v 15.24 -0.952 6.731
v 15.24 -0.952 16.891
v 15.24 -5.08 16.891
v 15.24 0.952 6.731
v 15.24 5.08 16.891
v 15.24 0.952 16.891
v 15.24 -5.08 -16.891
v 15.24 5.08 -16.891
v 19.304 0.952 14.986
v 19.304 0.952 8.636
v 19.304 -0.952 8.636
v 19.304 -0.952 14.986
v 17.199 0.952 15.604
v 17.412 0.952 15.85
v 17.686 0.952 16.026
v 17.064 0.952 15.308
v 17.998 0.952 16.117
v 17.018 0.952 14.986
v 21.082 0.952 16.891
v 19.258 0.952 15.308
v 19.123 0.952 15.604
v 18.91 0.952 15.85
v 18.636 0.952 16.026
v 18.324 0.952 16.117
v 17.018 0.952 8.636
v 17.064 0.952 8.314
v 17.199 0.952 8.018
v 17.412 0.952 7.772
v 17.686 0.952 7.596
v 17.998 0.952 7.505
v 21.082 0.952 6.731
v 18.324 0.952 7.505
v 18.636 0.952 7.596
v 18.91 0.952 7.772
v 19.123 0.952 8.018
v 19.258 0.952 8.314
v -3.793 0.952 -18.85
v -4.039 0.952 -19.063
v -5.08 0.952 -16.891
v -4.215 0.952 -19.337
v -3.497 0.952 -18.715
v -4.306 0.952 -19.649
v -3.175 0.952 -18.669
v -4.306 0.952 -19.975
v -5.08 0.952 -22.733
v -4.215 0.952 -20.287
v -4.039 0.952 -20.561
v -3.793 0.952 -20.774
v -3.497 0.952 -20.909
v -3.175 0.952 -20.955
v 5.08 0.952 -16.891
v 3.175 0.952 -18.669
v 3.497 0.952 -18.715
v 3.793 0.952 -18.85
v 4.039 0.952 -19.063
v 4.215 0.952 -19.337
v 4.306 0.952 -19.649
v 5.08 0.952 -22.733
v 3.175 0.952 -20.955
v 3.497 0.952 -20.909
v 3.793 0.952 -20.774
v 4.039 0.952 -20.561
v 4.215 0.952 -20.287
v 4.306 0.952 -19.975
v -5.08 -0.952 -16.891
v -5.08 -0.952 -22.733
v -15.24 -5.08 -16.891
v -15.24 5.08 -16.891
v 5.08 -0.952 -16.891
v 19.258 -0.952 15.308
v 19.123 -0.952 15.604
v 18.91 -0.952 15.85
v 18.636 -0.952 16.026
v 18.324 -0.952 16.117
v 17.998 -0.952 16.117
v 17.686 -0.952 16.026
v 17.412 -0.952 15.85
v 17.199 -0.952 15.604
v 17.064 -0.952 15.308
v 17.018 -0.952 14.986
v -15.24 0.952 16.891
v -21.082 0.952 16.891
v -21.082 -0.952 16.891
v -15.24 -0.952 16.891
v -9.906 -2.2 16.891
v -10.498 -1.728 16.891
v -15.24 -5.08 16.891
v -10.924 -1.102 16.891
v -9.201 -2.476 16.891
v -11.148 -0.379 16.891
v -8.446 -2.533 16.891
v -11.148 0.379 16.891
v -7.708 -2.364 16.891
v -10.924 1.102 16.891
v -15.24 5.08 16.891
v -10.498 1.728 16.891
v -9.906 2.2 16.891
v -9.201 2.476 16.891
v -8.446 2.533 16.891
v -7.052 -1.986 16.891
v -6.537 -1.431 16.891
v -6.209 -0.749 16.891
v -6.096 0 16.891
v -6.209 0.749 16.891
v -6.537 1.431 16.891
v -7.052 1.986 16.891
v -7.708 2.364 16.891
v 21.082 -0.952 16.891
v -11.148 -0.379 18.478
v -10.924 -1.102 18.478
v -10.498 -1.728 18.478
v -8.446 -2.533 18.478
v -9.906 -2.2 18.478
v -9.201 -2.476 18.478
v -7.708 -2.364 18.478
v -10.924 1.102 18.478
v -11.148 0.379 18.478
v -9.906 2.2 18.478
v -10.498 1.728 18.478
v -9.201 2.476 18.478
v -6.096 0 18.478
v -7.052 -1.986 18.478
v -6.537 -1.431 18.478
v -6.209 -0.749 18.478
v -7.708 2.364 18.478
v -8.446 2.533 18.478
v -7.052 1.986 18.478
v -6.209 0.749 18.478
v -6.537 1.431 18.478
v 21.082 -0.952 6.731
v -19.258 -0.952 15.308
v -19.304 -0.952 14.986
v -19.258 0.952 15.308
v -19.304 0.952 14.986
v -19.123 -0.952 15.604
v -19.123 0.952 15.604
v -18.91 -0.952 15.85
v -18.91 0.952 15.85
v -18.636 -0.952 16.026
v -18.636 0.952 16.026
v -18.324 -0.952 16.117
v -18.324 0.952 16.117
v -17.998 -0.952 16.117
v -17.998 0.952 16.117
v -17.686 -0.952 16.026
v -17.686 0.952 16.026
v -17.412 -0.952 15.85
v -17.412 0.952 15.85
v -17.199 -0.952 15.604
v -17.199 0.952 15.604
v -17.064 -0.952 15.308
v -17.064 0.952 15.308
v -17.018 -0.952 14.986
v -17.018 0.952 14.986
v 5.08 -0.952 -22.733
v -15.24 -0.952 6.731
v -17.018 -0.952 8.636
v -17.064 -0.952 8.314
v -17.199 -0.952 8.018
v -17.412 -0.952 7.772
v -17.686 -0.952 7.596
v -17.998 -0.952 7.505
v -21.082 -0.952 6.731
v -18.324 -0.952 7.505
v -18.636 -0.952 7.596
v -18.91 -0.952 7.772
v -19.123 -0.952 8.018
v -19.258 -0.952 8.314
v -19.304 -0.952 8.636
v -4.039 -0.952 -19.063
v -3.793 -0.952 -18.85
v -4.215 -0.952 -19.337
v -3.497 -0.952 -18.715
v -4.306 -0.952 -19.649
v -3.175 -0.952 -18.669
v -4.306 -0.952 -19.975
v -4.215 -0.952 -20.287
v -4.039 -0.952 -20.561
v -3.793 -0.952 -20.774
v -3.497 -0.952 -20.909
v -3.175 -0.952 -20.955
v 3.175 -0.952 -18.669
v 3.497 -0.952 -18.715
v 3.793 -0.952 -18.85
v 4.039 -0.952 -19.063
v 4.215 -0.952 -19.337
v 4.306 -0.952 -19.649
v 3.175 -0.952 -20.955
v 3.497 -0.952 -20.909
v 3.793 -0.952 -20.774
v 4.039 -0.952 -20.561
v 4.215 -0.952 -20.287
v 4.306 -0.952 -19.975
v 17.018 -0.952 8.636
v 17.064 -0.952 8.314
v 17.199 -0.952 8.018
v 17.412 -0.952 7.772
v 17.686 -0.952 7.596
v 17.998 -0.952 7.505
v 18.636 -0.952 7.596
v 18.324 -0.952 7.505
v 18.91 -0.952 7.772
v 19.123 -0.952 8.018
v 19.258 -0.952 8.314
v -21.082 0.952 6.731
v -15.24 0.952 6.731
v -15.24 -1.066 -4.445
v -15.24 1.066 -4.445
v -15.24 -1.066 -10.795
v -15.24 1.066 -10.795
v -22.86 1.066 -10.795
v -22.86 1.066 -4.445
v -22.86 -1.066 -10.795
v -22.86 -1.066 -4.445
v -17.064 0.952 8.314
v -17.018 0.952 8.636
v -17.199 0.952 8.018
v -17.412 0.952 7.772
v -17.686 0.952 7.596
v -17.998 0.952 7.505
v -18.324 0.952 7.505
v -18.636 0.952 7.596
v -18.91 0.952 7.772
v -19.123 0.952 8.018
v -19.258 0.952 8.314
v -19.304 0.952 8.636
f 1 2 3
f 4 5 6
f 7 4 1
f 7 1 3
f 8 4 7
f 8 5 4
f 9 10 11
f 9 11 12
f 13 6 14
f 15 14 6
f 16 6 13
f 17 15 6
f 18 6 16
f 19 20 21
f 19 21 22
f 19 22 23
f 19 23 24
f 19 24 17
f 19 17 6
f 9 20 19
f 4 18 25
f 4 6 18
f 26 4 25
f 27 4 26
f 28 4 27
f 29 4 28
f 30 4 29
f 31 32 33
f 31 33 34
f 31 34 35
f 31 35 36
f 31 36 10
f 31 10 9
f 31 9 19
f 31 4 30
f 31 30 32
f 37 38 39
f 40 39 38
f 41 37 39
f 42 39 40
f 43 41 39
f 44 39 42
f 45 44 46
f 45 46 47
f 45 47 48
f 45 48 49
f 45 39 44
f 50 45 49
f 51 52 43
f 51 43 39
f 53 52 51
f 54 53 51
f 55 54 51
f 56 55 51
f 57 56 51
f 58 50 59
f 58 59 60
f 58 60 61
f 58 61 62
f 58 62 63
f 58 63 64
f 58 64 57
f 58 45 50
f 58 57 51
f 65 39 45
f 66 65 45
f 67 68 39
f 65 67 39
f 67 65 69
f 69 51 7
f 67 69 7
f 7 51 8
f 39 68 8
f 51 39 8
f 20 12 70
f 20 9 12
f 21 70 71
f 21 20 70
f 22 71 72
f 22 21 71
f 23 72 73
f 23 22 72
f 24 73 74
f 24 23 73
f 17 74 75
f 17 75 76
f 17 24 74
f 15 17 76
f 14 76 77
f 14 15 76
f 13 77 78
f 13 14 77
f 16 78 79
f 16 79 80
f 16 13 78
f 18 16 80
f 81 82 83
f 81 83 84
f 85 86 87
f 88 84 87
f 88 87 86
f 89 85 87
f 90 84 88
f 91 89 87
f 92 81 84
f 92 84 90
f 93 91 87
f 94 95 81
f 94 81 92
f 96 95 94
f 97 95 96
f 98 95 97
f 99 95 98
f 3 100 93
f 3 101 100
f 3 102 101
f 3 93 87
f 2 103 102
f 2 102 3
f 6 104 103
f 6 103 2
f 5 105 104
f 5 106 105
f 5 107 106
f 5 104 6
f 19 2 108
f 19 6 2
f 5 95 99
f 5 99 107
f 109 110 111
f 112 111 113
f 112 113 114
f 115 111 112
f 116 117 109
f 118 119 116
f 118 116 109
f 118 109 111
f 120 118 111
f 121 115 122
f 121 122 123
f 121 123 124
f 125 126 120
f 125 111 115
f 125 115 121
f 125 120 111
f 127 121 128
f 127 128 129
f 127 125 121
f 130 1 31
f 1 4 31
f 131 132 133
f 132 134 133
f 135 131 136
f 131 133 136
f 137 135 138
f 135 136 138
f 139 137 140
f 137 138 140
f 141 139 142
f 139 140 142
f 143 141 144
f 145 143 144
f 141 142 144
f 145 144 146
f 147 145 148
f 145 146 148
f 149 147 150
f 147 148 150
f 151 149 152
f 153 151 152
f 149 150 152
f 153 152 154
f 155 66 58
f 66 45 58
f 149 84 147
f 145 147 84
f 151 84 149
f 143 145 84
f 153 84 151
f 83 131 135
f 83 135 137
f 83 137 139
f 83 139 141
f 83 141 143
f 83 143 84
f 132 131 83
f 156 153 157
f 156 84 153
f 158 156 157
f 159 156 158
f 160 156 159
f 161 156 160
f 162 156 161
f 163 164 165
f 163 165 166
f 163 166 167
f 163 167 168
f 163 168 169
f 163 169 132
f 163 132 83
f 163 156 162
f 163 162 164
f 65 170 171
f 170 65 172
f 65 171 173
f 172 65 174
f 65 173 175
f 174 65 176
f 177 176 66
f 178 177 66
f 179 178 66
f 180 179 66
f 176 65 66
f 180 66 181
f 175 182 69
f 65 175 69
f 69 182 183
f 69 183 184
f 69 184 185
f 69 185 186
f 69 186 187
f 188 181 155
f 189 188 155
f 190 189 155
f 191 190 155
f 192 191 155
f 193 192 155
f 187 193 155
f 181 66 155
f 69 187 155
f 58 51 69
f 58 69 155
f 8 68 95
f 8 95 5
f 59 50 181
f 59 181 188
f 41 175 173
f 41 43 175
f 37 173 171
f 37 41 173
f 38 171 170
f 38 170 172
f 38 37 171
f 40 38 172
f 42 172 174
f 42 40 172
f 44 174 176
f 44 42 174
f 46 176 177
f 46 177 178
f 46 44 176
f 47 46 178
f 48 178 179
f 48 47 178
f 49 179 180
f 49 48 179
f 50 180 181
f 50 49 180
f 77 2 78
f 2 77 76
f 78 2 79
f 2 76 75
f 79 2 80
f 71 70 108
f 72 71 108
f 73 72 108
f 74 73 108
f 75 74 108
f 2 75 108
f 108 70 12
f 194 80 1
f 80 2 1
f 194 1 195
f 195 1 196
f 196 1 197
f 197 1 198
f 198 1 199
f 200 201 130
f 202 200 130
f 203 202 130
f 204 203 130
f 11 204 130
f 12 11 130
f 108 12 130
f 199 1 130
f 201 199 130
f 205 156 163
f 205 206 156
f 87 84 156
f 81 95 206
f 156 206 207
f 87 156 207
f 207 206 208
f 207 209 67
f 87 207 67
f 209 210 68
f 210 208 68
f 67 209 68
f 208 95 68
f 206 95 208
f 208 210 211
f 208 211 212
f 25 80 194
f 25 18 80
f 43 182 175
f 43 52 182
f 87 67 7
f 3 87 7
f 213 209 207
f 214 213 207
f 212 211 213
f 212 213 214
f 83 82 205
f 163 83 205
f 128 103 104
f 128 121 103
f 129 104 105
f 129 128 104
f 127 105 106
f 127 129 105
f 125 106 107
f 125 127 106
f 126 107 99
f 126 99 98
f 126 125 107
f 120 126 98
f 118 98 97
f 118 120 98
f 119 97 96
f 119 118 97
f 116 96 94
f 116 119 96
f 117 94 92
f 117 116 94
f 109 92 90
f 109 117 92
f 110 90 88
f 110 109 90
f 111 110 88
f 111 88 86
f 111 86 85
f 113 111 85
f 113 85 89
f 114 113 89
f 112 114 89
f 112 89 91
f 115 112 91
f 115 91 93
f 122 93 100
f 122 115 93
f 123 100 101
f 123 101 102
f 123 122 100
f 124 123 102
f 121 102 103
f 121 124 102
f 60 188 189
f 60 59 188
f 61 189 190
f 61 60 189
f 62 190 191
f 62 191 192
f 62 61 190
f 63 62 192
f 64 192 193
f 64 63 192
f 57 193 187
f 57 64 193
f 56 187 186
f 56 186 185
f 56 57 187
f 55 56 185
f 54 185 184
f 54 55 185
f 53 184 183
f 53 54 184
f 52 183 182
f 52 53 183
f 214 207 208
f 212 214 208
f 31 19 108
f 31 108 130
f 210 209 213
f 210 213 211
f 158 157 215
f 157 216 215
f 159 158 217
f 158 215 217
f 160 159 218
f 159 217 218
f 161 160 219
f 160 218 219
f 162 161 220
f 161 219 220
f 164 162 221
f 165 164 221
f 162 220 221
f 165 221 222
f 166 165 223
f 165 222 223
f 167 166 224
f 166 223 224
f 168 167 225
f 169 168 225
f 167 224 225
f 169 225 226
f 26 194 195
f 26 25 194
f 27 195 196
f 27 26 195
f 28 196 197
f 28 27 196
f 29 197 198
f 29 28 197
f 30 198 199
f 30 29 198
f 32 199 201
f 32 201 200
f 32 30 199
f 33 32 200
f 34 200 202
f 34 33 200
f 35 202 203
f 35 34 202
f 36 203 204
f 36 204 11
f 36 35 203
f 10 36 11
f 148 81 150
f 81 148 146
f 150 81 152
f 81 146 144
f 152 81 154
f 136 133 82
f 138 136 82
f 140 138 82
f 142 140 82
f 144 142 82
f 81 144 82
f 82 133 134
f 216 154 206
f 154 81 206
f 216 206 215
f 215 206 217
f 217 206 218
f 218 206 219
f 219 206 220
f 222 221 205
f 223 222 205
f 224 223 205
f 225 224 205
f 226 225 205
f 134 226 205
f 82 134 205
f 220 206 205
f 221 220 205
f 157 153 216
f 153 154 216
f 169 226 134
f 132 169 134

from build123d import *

# Parameters (mm, degrees)
SKETCH1_W           = 30.48
SKETCH1_H           = 33.782
BOSS_EXTRUDE1_DEPTH = 5.08
SKETCH2_R           = 2.54
BOSS_EXTRUDE2_DEPTH = 1.5875
SKETCH3_W           = 5.842
SKETCH3_H           = 10.16
BOSS_EXTRUDE3_DEPTH = 0.9525
SKETCH4_W           = 10.16
SKETCH4_H           = 5.842
BOSS_EXTRUDE4_DEPTH = 0.9525
SKETCH5_W           = 6.35
SKETCH5_H           = 2.131234452
BOSS_EXTRUDE5_DEPTH = 7.62


with BuildPart() as part:
    # Sketch1 → Boss-Extrude1 (new body, symmetric)
    with BuildSketch(Plane(origin=(0, 0, 0), x_dir=(1, 0, 0), z_dir=(0, 1, 0))):
        Rectangle(SKETCH1_W, SKETCH1_H)
    extrude(amount=BOSS_EXTRUDE1_DEPTH, both=True)

    # Sketch2 → Boss-Extrude2 (add, symmetric)
    with BuildSketch(Plane.XY.offset(16.891)):
        with Locations((-8.636, 0)):
            Circle(SKETCH2_R)
    extrude(amount=BOSS_EXTRUDE2_DEPTH, both=True)

    # Sketch3 → Boss-Extrude3 (add, symmetric)
    with BuildSketch(Plane(origin=(0, 0, 0), x_dir=(1, 0, 0), z_dir=(0, 1, 0))):
        with Locations((18.161, -11.811)):
            Rectangle(SKETCH3_W, SKETCH3_H)
        with BuildLine():
            Line((19.304, -8.636), (19.304, -14.986))
            ThreePointArc((19.304, -14.986), (18.161, -16.129), (17.018, -14.986))
            Line((17.018, -14.986), (17.018, -8.636))
            ThreePointArc((17.018, -8.636), (18.161, -7.493), (19.304, -8.636))
        make_face(mode=Mode.SUBTRACT)
    boss_extrude3 = extrude(amount=BOSS_EXTRUDE3_DEPTH, both=True)

    # Mirror1: Boss-Extrude3 across plane
    add(boss_extrude3.mirror(Plane(origin=(0, 0, 0), x_dir=(0, 0, 1), z_dir=(1, 0, 0))))

    # Sketch4 → Boss-Extrude4 (add, symmetric)
    with BuildSketch(Plane(origin=(0, 0, 0), x_dir=(1, 0, 0), z_dir=(0, 1, 0))):
        with Locations((0, 19.812)):
            Rectangle(SKETCH4_W, SKETCH4_H)
        with BuildLine():
            Line((-3.175, 20.955), (3.175, 20.955))
            ThreePointArc((3.175, 20.955), (4.318, 19.812), (3.175, 18.669))
            Line((3.175, 18.669), (-3.175, 18.669))
            ThreePointArc((-3.175, 18.669), (-4.318, 19.812), (-3.175, 20.955))
        make_face(mode=Mode.SUBTRACT)
    extrude(amount=BOSS_EXTRUDE4_DEPTH, both=True)

    # Sketch5 → Boss-Extrude5 (add)
    with BuildSketch(Plane.ZY.offset(15.24)):
        with Locations((-7.62, 0)):
            Rectangle(SKETCH5_W, SKETCH5_H)
    extrude(amount=BOSS_EXTRUDE5_DEPTH)


solid = part.part
